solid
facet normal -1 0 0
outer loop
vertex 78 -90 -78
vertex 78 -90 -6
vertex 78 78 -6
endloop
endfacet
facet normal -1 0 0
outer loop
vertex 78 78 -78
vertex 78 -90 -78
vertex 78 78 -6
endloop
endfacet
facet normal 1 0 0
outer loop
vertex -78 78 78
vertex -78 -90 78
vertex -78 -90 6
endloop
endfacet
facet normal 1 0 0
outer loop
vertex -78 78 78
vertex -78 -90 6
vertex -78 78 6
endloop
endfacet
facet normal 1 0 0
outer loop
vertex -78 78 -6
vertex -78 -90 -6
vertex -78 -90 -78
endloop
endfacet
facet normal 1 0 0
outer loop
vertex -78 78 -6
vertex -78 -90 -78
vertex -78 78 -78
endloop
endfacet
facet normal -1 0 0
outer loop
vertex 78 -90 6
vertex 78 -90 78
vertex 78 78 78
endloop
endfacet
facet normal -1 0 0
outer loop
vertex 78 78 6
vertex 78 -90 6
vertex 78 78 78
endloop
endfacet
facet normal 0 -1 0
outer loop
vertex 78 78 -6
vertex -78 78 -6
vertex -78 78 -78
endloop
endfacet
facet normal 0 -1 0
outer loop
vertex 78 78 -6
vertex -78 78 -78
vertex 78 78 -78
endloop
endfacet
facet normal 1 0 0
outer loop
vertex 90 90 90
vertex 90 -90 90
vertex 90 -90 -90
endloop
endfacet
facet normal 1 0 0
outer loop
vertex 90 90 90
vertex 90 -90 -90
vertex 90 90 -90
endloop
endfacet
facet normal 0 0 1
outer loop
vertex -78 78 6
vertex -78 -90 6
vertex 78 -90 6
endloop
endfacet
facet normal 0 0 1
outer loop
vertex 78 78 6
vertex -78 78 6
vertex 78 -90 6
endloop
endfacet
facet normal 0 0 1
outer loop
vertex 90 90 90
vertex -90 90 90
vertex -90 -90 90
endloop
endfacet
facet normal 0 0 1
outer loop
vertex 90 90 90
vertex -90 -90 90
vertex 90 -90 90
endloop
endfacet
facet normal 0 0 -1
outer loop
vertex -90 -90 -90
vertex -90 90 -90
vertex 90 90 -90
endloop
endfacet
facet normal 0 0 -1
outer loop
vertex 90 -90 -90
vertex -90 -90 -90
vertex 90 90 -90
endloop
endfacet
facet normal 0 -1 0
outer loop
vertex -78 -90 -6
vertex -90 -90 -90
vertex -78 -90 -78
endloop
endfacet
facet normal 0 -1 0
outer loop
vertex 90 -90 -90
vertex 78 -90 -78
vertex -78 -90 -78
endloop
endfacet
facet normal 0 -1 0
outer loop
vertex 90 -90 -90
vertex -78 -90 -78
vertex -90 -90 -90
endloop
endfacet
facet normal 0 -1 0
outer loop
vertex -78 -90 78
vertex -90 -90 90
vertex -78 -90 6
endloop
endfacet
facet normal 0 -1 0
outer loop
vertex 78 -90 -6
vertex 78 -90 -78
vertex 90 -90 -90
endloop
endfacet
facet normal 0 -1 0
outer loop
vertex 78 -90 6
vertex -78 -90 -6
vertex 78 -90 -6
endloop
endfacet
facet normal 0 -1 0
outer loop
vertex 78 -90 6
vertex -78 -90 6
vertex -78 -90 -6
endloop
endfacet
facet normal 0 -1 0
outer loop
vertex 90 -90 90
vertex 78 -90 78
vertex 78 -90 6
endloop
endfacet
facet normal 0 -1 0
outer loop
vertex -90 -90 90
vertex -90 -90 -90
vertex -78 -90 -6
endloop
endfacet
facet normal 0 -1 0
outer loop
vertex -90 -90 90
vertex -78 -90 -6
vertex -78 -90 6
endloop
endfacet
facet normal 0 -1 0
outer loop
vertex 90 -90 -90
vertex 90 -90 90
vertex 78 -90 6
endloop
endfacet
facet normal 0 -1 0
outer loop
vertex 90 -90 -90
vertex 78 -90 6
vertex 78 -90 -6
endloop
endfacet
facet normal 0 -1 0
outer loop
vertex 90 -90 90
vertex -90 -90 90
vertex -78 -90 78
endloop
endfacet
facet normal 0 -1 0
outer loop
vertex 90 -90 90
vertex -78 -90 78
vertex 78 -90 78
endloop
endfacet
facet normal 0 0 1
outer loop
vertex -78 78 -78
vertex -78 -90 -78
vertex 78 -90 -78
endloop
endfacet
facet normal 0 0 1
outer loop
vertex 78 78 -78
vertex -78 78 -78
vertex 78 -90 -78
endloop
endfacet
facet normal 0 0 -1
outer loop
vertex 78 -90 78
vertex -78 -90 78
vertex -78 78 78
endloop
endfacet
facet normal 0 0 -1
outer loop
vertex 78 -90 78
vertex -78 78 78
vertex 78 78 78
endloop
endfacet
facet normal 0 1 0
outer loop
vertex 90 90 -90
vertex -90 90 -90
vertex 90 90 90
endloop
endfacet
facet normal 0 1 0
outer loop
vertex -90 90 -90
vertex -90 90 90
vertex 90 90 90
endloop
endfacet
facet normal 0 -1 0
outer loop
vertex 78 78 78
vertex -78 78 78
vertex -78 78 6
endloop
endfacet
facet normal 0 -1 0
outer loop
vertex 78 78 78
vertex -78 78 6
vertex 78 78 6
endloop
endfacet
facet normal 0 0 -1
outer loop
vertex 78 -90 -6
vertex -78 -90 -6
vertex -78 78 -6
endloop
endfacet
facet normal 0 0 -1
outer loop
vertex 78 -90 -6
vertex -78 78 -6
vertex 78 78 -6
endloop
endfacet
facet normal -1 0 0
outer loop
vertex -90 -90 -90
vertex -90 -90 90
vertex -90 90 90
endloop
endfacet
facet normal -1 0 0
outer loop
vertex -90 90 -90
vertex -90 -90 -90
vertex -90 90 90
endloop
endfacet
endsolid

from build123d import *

# Parameters (mm, degrees)
F0_W     = 180
F0_H     = 180
F1_DEPTH = 90
F2_T     = -12
F3_W     = 156
F3_H     = 12
F4_DEPTH = 168


with BuildPart() as f1:
    # F0 (on Top) → F1 (new body, symmetric)
    with BuildSketch(Plane.XY):
        Rectangle(F0_W, F0_H)
    extrude(amount=F1_DEPTH, both=True)

    # F2
    f2_openings = [f1.faces().sort_by_distance(p)[0] for p in [
        (0, -90, 0),
    ]]
    offset(amount=F2_T, openings=f2_openings)

    # F3 (on face) → F4 (join)
    with BuildSketch(Plane.XZ.offset(-78)):
        Rectangle(F3_W, F3_H)
    extrude(amount=F4_DEPTH)


solid = f1.part
